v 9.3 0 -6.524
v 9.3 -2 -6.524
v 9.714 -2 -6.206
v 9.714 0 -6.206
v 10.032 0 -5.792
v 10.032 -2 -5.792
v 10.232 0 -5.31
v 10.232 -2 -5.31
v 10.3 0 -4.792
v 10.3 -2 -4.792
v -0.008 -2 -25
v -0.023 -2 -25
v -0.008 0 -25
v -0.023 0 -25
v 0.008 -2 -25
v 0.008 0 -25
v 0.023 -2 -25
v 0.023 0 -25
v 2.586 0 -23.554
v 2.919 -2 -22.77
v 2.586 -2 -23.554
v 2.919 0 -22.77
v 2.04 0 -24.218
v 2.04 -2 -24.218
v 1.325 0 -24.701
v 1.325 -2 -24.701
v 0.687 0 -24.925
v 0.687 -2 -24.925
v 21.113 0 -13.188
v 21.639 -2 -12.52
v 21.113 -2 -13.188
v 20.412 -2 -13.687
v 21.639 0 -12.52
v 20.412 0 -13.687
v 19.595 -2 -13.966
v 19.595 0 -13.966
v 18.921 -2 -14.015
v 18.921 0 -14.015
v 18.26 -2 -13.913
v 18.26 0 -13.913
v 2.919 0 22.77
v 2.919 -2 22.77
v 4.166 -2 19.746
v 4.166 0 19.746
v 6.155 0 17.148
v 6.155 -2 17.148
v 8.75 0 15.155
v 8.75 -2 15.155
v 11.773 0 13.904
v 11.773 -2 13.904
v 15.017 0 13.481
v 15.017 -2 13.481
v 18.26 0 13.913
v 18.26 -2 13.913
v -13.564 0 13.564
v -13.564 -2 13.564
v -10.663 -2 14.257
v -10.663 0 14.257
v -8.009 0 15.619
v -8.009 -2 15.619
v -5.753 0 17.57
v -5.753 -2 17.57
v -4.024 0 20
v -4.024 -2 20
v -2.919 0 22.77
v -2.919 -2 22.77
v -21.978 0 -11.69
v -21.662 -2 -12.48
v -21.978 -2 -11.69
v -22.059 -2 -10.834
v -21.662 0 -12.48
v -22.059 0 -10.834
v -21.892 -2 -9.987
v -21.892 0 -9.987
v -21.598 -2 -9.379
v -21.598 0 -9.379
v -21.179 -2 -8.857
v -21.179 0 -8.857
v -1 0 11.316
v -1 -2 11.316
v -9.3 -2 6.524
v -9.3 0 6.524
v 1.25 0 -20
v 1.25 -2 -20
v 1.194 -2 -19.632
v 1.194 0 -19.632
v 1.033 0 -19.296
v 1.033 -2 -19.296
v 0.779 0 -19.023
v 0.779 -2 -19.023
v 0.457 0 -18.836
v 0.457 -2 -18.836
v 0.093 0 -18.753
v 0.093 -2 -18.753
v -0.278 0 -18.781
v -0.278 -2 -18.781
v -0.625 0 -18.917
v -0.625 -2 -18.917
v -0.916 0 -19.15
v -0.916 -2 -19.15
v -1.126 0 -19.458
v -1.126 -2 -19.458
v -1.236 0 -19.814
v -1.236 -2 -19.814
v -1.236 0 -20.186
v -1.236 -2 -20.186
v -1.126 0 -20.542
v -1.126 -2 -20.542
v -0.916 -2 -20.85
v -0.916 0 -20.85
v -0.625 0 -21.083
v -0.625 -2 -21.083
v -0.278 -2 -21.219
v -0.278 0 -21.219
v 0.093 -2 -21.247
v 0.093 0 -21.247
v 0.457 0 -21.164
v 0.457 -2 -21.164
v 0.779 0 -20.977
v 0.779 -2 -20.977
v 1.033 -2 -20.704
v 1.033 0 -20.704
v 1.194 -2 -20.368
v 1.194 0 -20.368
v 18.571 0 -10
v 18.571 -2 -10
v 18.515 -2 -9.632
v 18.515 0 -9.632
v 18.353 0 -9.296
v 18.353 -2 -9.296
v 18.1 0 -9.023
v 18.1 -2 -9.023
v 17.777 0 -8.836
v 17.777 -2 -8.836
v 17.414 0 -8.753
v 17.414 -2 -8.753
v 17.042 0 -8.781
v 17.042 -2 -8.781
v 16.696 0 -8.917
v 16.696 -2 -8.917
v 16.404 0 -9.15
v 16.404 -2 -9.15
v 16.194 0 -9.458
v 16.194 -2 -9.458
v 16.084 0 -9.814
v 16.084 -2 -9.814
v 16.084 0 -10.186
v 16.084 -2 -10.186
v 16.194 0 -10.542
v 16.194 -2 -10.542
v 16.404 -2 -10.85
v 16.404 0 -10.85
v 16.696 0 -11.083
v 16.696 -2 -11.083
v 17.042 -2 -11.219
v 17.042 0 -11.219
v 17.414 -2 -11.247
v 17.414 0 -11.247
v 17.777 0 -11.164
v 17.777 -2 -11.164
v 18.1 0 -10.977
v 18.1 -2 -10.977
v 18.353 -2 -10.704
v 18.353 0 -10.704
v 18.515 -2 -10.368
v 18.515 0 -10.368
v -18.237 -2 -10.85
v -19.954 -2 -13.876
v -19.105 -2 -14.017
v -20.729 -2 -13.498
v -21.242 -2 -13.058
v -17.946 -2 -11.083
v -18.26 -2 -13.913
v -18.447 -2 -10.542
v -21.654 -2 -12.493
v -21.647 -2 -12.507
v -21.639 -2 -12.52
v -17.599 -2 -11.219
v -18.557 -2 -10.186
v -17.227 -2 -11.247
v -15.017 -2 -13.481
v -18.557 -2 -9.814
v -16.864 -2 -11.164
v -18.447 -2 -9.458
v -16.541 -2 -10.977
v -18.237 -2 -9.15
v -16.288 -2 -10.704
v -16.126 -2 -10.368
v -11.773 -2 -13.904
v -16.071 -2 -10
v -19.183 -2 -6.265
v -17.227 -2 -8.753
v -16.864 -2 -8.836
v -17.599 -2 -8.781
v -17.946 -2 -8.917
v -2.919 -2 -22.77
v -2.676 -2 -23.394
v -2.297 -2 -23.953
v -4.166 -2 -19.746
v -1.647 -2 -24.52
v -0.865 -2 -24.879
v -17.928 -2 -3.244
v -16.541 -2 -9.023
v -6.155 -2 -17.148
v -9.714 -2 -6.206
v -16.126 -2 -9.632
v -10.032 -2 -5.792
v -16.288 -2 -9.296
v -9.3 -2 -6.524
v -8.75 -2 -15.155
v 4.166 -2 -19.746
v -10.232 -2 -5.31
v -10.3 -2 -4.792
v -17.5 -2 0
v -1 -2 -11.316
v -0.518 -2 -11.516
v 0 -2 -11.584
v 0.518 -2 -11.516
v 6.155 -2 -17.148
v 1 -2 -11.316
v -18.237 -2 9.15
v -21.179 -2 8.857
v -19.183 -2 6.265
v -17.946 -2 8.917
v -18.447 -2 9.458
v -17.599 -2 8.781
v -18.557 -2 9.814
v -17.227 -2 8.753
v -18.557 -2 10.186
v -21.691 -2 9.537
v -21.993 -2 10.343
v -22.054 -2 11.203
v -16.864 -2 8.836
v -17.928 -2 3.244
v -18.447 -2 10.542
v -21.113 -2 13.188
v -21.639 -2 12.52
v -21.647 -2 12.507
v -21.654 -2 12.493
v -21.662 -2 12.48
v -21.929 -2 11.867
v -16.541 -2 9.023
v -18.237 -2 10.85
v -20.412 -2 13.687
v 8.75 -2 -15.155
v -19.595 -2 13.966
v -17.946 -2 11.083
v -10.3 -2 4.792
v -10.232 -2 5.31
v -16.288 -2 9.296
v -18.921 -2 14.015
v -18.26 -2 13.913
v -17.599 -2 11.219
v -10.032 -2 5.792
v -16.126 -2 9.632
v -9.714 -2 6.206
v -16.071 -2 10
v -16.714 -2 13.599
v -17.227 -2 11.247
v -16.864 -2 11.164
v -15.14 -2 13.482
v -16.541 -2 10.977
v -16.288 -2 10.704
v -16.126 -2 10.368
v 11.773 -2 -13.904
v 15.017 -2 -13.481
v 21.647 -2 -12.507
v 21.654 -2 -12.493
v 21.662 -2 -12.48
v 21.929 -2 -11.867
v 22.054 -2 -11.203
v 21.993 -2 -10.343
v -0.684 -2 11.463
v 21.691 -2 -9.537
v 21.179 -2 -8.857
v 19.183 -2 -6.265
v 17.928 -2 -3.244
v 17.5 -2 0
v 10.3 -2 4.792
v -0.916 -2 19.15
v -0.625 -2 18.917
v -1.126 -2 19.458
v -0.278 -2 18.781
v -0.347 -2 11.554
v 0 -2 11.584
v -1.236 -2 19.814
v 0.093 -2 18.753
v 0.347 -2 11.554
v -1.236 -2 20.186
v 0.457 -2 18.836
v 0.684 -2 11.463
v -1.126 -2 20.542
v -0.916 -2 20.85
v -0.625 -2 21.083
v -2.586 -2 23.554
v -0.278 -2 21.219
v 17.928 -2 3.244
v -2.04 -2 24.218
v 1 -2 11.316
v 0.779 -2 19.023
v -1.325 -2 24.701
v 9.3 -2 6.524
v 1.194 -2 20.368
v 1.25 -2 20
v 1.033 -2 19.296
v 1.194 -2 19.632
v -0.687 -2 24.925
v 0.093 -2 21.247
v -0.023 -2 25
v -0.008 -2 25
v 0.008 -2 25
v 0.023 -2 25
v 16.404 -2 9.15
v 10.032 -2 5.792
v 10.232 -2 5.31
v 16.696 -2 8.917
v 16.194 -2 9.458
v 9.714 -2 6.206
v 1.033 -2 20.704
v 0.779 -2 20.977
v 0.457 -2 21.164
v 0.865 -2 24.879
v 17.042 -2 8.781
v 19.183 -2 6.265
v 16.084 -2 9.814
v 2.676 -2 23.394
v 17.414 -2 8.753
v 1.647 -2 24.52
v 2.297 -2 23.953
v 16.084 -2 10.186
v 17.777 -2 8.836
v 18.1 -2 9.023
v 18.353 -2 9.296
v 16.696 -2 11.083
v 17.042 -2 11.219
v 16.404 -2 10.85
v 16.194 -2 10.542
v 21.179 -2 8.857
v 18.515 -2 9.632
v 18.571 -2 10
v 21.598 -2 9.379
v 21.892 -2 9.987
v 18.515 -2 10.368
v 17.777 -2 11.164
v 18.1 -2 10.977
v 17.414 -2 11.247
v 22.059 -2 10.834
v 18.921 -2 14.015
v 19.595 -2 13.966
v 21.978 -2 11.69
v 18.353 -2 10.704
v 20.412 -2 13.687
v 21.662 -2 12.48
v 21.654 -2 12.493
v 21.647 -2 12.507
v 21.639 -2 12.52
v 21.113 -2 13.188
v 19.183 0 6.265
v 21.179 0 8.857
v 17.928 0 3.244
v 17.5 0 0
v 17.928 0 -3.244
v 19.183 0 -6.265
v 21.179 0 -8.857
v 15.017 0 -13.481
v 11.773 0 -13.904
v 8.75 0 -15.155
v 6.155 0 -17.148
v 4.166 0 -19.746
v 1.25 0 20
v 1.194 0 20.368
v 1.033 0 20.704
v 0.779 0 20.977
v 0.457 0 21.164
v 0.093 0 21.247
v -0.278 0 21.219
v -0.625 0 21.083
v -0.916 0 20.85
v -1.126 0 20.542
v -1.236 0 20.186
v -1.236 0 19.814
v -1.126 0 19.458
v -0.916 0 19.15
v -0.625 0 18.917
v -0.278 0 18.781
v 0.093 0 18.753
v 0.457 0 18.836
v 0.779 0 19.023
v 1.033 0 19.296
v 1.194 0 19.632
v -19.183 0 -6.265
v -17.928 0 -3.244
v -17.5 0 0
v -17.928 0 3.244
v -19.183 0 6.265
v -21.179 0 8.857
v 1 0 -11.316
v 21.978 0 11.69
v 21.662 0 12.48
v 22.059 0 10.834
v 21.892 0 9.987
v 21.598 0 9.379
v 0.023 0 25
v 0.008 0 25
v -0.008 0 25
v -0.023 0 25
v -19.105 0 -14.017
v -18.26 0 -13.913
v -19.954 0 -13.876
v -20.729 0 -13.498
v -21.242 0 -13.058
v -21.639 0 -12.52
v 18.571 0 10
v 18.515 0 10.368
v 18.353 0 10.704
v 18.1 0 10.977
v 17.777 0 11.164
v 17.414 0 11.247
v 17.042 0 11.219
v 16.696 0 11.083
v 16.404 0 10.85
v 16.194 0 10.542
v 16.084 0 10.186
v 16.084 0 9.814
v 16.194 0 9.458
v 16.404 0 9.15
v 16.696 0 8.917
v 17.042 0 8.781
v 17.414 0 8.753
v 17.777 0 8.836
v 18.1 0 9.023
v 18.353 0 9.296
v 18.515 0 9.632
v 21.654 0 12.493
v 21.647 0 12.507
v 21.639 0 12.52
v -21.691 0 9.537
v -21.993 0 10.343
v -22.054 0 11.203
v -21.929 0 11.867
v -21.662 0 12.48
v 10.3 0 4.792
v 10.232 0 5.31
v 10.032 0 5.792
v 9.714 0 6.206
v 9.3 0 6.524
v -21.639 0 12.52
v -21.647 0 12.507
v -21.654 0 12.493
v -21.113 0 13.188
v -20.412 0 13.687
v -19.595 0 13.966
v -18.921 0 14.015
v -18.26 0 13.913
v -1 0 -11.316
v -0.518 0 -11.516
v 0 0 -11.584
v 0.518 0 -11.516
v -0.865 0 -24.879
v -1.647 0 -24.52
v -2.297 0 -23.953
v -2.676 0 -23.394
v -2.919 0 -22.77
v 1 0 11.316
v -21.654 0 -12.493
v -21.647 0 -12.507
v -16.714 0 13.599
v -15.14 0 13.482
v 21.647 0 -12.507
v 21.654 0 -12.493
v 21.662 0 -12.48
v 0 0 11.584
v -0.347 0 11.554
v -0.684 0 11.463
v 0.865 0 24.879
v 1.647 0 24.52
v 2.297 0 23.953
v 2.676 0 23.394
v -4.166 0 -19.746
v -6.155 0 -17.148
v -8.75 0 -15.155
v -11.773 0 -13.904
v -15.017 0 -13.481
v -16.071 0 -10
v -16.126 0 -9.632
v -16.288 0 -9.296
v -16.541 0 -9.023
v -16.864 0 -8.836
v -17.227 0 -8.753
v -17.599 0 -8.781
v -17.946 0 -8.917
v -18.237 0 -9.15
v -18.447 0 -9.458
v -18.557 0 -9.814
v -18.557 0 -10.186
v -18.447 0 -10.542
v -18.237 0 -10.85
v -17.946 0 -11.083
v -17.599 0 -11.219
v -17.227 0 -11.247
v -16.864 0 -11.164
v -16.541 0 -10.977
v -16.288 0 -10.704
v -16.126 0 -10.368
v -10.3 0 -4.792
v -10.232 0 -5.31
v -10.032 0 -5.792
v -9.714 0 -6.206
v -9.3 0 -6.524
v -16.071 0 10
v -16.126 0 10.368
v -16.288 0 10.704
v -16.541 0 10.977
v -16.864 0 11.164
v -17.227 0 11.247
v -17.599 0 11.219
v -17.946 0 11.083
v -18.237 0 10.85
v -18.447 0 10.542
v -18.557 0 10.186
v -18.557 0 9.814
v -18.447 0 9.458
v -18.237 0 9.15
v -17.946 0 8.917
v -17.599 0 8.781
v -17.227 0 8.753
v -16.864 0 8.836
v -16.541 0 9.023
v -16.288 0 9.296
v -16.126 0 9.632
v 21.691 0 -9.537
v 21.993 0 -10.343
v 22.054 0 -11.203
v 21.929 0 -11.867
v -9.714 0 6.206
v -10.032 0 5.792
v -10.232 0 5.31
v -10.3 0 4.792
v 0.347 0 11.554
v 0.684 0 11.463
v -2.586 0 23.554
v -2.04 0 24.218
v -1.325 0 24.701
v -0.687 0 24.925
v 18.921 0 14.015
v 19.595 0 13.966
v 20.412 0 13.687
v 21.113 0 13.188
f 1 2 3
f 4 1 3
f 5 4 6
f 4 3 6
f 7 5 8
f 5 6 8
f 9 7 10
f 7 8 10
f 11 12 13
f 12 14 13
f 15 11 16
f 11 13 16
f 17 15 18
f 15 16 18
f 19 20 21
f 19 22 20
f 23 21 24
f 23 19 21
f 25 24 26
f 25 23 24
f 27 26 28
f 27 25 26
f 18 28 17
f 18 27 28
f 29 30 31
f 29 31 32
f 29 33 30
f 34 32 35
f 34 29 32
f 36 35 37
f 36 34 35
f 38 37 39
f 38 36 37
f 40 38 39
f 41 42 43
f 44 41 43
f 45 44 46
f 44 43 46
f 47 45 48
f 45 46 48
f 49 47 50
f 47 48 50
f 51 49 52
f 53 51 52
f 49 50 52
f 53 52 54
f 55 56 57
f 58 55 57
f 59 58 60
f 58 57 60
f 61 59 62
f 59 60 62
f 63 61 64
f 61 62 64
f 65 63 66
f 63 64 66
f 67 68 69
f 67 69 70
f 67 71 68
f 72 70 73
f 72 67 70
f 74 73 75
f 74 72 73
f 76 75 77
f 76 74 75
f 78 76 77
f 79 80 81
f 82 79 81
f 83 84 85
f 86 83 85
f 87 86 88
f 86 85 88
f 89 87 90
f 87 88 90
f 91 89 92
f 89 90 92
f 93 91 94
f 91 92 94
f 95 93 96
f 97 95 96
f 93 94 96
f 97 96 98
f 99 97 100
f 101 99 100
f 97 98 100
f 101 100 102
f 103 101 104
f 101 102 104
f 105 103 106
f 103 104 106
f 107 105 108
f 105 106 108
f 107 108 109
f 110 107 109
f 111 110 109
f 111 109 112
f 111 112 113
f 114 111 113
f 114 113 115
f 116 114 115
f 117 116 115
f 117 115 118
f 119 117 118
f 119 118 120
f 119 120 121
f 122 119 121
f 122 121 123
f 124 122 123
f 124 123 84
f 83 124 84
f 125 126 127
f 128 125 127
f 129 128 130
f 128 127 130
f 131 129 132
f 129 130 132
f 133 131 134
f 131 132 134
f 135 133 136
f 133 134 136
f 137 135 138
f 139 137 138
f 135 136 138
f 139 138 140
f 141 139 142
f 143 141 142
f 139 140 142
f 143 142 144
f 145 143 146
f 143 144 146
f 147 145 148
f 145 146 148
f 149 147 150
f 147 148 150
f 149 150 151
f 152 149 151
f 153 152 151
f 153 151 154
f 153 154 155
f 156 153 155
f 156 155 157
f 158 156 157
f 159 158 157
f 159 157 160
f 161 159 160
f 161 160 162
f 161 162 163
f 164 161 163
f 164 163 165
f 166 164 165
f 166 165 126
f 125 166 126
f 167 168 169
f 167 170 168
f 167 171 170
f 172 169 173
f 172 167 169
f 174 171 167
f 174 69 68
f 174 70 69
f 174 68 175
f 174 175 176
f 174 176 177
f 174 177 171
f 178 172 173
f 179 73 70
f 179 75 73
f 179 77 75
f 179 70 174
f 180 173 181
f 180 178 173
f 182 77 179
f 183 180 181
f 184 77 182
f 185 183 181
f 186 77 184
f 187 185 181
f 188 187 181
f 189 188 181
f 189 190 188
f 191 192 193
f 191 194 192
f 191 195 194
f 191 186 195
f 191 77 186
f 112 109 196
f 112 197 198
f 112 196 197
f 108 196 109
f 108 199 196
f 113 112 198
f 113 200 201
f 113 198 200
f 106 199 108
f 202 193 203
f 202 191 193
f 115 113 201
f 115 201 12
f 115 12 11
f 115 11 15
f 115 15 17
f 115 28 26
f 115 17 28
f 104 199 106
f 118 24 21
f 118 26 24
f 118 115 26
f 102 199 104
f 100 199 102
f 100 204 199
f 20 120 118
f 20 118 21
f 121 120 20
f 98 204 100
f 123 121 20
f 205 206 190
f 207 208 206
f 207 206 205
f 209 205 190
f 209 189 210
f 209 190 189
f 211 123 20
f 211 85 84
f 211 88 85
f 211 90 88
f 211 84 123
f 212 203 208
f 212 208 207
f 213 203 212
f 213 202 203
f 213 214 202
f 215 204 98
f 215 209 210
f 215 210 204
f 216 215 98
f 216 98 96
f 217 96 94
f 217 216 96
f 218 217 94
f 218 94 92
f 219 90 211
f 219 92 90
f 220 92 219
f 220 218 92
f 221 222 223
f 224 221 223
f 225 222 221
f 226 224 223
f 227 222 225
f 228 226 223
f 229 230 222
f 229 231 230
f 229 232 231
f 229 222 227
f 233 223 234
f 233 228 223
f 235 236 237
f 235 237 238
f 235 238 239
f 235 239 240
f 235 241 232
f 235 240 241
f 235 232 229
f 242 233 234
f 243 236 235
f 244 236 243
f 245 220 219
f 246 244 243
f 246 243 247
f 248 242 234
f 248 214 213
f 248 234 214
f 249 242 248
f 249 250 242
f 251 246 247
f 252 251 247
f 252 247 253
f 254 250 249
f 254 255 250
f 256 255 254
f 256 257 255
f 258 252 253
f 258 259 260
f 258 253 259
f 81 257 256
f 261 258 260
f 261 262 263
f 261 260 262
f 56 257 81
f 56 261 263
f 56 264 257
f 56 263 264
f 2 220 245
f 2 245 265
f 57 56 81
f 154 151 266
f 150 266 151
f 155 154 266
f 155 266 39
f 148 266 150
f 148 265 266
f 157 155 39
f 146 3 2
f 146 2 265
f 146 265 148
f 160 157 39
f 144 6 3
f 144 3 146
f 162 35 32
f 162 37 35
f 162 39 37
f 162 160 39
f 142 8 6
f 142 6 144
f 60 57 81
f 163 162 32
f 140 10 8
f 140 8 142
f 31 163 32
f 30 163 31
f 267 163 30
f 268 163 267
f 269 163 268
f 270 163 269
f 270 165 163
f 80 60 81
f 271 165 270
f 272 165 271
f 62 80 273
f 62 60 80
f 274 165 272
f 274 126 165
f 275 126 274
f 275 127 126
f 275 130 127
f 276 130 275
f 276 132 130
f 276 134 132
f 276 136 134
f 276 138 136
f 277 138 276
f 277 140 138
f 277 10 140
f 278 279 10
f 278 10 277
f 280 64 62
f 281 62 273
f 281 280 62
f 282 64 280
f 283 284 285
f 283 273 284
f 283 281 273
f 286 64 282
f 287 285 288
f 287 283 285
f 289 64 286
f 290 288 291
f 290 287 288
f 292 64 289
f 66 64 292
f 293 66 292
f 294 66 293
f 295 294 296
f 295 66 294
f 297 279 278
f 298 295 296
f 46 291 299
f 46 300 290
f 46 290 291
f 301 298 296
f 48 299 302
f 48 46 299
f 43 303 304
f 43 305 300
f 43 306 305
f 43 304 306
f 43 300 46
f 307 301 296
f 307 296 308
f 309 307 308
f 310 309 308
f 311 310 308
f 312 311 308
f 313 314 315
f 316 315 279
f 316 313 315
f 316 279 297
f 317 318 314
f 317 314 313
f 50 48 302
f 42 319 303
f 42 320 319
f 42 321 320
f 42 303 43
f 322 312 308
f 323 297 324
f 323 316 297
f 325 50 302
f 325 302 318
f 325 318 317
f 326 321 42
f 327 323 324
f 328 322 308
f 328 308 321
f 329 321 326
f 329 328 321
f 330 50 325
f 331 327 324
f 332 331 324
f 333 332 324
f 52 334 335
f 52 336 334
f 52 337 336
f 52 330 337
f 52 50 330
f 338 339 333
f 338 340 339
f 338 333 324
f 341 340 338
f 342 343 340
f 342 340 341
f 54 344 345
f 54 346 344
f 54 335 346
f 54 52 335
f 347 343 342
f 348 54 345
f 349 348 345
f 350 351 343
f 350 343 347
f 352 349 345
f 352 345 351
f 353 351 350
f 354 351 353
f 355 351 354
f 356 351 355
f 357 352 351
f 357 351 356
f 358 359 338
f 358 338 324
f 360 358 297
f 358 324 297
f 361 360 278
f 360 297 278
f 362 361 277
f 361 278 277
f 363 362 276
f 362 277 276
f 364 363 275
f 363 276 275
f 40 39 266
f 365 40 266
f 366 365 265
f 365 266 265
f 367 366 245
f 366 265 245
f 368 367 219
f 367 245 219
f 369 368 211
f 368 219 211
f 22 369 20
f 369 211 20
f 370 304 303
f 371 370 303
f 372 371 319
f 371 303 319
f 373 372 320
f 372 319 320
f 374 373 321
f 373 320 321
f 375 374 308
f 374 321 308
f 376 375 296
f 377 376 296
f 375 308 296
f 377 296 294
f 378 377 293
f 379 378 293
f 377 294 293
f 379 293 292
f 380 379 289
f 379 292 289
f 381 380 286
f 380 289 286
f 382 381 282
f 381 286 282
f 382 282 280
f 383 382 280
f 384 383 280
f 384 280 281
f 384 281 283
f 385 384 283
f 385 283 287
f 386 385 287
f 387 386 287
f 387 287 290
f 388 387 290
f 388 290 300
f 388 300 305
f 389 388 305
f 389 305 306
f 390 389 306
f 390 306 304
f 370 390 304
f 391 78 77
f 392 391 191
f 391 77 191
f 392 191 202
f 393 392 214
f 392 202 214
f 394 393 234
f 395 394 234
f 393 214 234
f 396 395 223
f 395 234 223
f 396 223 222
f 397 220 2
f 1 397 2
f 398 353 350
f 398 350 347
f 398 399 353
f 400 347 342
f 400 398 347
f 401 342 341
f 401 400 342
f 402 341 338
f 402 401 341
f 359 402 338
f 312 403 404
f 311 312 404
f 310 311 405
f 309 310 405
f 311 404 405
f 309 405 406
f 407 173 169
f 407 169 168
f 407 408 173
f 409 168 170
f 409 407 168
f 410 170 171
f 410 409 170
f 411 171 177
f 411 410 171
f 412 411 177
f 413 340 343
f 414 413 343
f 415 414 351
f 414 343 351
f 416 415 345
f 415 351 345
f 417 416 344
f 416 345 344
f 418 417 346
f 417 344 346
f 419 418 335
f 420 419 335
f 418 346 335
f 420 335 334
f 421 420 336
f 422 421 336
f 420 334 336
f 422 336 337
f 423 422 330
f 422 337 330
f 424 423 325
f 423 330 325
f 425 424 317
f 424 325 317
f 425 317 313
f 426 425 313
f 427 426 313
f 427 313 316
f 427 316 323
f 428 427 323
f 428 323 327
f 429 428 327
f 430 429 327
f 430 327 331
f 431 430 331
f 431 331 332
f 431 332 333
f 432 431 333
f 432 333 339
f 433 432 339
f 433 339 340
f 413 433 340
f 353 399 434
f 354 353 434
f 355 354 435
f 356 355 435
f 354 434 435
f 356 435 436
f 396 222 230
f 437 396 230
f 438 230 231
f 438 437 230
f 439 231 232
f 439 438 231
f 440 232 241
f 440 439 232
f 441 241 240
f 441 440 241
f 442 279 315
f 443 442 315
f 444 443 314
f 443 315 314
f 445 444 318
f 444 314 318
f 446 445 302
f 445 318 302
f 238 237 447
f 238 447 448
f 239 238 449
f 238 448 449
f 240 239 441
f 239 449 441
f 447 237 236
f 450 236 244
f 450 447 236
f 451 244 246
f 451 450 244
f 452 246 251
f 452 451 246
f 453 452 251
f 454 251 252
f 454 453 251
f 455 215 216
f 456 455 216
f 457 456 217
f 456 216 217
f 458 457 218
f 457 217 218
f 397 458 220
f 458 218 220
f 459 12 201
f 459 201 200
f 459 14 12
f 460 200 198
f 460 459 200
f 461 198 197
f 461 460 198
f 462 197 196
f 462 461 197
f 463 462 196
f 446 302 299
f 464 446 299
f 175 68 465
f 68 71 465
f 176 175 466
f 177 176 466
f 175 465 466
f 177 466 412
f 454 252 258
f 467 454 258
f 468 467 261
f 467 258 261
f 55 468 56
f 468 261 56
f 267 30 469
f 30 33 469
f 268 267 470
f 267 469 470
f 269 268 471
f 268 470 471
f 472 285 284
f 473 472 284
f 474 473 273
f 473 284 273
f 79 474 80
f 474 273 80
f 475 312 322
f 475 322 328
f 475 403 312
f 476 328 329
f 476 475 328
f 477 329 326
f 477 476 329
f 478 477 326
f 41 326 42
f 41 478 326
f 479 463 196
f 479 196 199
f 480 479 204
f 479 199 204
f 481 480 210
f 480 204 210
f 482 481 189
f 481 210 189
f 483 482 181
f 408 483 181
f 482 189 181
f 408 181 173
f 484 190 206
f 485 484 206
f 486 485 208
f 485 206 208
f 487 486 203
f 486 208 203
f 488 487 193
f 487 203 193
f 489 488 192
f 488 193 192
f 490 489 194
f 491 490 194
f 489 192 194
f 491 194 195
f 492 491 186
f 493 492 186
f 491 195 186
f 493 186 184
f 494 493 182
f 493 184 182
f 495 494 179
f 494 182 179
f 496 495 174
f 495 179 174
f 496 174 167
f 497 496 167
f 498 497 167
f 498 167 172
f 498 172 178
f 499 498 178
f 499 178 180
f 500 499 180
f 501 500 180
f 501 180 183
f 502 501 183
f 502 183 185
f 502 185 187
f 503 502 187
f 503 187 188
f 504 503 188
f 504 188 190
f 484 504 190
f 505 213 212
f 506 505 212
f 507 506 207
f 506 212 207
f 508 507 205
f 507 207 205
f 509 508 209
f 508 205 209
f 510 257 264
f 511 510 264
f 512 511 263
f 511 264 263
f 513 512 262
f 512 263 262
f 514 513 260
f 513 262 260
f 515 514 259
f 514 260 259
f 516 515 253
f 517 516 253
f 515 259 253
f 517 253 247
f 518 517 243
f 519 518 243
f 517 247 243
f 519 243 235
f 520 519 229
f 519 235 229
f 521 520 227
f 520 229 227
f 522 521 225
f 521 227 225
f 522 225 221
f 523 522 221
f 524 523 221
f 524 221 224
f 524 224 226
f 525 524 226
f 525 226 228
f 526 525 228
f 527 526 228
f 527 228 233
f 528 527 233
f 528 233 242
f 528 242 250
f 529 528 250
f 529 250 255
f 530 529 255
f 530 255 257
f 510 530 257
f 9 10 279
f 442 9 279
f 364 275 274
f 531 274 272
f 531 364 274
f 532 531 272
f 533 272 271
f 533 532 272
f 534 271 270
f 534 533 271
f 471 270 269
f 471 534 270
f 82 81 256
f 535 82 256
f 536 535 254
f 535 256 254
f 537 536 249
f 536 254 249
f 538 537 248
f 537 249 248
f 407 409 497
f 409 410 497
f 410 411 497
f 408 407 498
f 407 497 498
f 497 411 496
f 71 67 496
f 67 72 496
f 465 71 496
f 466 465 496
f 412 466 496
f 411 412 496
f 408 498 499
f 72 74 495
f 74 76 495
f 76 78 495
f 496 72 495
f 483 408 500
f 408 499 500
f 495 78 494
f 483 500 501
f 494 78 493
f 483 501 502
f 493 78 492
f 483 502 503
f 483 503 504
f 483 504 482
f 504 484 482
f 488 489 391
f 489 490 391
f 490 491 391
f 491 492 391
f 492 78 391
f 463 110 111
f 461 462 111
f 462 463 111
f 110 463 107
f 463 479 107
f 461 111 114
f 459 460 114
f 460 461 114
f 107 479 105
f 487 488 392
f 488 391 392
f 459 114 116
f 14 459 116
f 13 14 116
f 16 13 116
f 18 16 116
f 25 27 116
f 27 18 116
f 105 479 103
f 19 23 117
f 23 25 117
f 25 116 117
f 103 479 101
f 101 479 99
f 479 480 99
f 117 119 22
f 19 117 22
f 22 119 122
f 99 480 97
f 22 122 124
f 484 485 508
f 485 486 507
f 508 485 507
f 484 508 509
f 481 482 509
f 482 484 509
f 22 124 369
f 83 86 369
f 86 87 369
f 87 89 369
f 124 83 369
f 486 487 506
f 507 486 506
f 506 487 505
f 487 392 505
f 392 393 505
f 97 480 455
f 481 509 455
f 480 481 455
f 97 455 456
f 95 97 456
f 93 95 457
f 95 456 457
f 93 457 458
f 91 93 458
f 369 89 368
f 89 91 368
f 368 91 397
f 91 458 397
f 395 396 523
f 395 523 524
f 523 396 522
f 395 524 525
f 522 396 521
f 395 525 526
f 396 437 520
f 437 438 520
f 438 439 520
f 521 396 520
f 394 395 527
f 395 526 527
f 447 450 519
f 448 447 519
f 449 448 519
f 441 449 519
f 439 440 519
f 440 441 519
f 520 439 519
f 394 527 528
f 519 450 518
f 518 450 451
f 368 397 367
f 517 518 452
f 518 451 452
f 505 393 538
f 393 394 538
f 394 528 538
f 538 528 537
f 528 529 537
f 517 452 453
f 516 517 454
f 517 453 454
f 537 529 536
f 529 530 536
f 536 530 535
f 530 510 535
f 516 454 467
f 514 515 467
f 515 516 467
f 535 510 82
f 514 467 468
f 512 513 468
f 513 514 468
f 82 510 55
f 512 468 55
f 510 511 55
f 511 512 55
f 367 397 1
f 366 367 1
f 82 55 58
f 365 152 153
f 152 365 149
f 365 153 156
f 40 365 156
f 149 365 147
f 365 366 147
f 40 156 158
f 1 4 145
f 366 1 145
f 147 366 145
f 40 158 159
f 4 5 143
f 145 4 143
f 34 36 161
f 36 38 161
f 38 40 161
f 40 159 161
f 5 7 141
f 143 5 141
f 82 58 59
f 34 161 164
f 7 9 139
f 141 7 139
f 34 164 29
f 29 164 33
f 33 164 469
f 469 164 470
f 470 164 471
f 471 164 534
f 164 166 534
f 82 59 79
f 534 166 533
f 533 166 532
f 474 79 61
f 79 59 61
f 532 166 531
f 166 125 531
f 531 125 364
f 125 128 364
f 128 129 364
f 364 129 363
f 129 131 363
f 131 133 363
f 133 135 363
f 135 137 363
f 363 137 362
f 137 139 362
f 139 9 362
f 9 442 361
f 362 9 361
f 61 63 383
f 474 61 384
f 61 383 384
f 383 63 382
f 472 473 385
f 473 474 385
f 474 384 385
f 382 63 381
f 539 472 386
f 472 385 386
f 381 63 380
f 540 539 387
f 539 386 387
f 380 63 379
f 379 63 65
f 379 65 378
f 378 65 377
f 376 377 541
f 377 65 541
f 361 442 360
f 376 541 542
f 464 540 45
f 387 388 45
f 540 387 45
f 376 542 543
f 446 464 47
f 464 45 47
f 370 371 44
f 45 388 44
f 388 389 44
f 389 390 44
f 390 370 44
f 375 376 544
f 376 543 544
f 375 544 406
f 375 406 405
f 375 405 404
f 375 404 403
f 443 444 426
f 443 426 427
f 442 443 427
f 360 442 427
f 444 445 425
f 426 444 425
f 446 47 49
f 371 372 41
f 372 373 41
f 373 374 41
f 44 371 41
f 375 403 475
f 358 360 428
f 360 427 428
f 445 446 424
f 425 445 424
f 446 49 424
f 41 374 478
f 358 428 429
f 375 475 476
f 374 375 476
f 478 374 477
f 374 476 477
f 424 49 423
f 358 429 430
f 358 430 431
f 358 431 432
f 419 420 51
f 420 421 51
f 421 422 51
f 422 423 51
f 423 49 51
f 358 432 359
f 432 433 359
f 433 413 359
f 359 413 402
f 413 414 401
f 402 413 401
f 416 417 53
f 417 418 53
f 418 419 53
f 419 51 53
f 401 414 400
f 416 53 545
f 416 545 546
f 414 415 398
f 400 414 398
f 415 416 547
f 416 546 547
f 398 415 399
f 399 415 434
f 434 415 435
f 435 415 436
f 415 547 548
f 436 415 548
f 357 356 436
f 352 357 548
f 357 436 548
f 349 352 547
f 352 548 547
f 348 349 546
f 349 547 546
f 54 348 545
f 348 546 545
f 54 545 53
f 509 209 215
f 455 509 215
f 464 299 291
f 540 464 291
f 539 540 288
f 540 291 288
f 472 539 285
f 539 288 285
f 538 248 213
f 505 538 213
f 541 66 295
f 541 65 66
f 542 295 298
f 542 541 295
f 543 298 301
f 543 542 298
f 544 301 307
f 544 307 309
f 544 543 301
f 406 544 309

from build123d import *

# Parameters (mm, degrees)
F0_R     = 25
F1_DEPTH = 2
F3_DEPTH = 2.001
F4_R     = 1.25
F5_DEPTH = 2.001
F6_R     = 12.5
F7_DEPTH = 2.001
F8_R     = 3


with BuildPart() as f1:
    # F0 (on Front) → F1 (new body)
    with BuildSketch(Plane.XZ):
        Circle(F0_R)
    extrude(amount=F1_DEPTH)

    # F2 (on face) → F3 (cut, through all)
    with BuildSketch(Plane.XZ.offset(2)):
        with BuildLine():
            Line((-1, 11.3160652761), (-9.3, 6.5240580418))
            ThreePointArc((-9.3, 6.5240580418), (-10.0320508076, 5.7920072343), (-10.3, 4.7920072343))
            Line((-10.3, 4.7920072343), (-10.3, -4.7920072343))
            ThreePointArc((-10.3, -4.7920072343), (-10.0320508076, -5.7920072343), (-9.3, -6.5240580418))
            Line((-9.3, -6.5240580418), (-1, -11.3160652761))
            ThreePointArc((-1, -11.3160652761), (0, -11.5840144685), (1, -11.3160652761))
            Line((1, -11.3160652761), (9.3, -6.5240580418))
            ThreePointArc((9.3, -6.5240580418), (10.0320508076, -5.7920072343), (10.3, -4.7920072343))
            Line((10.3, -4.7920072343), (10.3, 0.3542550839))
            Line((10.3, 0.3542550839), (0, 0.3542550839))
            Line((0, 0.3542550839), (0, 11.5840144685))
            ThreePointArc((0, 11.5840144685), (-0.5176380902, 11.5158661211), (-1, 11.3160652761))
        make_face()
        with BuildLine():
            ThreePointArc((1, 11.3160652761), (0.5176380902, 11.5158661211), (0, 11.5840144685))
            Line((0, 11.5840144685), (0, 0.3542550839))
            Line((0, 0.3542550839), (10.3, 0.3542550839))
            Line((10.3, 0.3542550839), (10.3, 4.7920072343))
            ThreePointArc((10.3, 4.7920072343), (10.0320508076, 5.7920072343), (9.3, 6.5240580418))
            Line((9.3, 6.5240580418), (1, 11.3160652761))
        make_face()
    extrude(amount=-F3_DEPTH, mode=Mode.SUBTRACT)

    # F4 (on face) → F5 (cut, through all)
    with BuildSketch(Plane.XZ.offset(2)):
        with Locations((0, 20)):
            Circle(F4_R)
        with Locations((-17.3205080757, 10)):
            Circle(F4_R)
        with Locations((-17.3205080757, -10)):
            Circle(F4_R)
        with Locations((0, -20)):
            Circle(F4_R)
        with Locations((17.3205080757, -10)):
            Circle(F4_R)
        with Locations((17.3205080757, 10)):
            Circle(F4_R)
    extrude(amount=-F5_DEPTH, mode=Mode.SUBTRACT)

    # F6 (on face) → F7 (cut, through all)
    with BuildSketch(Plane.XZ.offset(2)):
        with BuildLine():
            ThreePointArc((17.5, 0), (30, -12.5), (42.5, 0))
            ThreePointArc((42.5, 0), (30, 12.5), (17.5, 0))
        make_face()
        with BuildLine():
            ThreePointArc((-27.4171924337, 27.4171924337), (-23.8388347648, 17.1419273487), (-13.5635696798, 13.5635696798))
            Line((-13.5635696798, 13.5635696798), (-27.4171924337, 27.4171924337))
        make_face()
        with BuildLine():
            Line((-27.4171924337, 27.4171924337), (-13.5635696798, 13.5635696798))
            ThreePointArc((-13.5635696798, 13.5635696798), (-5.6671178353, 17.6652759282), (-2.5, 25.9807621135))
            ThreePointArc((-2.5, 25.9807621135), (-14.2805924038, 38.4600430508), (-27.4171924337, 27.4171924337))
        make_face()
        with Locations((15, 25.9807621135)):
            Circle(F6_R)
        with Locations((-30, 0)):
            Circle(F6_R)
        with Locations((-15, -25.9807621135)):
            Circle(F6_R)
        with Locations((15, -25.9807621135)):
            Circle(F6_R)
    extrude(amount=-F7_DEPTH, mode=Mode.SUBTRACT)

    # F8
    f8_edges = [f1.edges().sort_by_distance(p)[0] for p in [
        (22.8125, -1, 10.226918),
        (22.8125, -1, -10.226918),
        (20.26302, -1, 14.642746),
        (2.54948, -1, 24.869663),
        (20.26302, -1, -14.642746),
        (2.54948, -1, -24.869663),
        (-2.54948, -1, -24.869663),
        (-20.26302, -1, -14.642746),
        (-22.8125, -1, -10.226918),
        (-22.8125, -1, 10.226918),
        (-20.26302, -1, 14.642746),
        (-2.54948, -1, 24.869663),
    ]]
    fillet(f8_edges, radius=F8_R)


solid = f1.part
